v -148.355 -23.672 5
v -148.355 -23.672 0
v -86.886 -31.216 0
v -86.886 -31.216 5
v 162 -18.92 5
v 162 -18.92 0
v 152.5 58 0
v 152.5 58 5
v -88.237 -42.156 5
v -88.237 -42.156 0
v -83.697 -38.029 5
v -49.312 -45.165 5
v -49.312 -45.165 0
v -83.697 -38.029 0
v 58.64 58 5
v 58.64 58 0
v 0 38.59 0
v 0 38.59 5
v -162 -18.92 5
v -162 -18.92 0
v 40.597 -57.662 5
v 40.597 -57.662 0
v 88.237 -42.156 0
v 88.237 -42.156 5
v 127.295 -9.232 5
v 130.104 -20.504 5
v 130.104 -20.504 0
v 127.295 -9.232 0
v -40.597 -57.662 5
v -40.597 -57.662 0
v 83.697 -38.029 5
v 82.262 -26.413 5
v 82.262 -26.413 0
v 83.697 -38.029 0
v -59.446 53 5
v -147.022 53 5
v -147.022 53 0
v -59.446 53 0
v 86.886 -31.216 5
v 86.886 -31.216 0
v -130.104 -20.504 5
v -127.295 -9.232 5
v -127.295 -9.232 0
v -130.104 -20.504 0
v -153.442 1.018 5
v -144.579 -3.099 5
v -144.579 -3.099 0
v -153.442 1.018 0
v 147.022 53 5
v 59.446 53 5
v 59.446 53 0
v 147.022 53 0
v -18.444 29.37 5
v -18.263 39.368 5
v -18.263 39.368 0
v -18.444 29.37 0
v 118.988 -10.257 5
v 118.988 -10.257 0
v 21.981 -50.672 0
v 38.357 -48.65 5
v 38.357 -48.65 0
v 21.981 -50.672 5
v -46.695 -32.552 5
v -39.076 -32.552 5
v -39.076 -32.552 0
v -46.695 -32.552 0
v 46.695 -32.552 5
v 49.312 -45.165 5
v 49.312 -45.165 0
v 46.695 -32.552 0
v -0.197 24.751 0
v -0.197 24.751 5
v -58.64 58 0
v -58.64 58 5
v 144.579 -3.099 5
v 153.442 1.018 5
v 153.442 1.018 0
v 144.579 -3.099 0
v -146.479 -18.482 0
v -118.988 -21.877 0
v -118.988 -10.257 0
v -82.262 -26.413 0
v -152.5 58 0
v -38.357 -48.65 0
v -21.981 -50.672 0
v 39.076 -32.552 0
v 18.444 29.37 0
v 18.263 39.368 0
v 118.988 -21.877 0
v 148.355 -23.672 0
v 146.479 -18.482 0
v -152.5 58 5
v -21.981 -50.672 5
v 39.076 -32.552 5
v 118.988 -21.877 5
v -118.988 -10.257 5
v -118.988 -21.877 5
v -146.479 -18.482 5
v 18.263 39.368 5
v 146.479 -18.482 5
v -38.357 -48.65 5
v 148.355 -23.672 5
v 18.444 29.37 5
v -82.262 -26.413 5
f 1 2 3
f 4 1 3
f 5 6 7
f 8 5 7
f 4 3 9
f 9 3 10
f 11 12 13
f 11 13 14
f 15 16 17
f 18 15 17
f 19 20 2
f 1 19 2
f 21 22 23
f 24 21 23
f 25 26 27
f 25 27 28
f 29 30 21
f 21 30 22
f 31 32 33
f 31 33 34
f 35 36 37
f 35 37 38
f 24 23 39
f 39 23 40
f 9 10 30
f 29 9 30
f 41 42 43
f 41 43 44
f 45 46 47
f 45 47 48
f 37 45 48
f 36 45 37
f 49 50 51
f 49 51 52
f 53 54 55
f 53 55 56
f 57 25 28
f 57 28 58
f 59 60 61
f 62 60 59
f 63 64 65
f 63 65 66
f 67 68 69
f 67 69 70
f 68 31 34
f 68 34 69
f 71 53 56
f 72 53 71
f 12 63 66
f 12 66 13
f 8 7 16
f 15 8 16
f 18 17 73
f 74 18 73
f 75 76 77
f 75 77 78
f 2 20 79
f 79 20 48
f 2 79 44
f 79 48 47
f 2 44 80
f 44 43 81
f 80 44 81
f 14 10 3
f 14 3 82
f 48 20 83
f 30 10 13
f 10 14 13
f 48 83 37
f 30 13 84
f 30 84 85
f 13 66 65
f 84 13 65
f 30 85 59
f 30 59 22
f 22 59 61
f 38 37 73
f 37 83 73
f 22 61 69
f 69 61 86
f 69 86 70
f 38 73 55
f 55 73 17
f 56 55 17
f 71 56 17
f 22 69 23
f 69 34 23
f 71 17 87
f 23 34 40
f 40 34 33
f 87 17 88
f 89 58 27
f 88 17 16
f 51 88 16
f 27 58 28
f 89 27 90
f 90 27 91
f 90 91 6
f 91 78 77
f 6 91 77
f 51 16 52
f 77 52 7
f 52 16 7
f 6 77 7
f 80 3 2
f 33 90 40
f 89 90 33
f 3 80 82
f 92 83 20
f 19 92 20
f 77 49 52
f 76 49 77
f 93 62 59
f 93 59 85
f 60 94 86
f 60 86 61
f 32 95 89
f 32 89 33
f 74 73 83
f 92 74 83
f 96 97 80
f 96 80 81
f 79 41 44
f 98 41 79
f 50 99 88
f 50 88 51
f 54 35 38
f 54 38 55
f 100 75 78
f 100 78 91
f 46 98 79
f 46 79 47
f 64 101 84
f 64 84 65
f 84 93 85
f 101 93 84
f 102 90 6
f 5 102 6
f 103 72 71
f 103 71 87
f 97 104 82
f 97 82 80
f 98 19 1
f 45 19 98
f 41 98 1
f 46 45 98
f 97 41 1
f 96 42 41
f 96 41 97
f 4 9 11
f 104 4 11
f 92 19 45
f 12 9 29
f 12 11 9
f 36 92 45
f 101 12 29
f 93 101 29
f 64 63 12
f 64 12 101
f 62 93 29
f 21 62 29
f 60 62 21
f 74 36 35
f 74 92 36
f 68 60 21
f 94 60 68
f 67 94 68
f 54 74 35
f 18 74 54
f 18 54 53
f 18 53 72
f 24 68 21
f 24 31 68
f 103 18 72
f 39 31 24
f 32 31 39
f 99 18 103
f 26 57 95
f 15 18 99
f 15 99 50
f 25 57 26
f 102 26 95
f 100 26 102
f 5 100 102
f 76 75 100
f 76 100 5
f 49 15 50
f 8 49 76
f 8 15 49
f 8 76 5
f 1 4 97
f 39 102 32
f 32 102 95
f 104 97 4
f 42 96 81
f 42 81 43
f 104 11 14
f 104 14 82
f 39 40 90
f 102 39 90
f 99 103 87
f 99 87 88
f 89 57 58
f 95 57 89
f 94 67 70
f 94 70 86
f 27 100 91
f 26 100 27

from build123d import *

# Parameters (mm, degrees)
EXTRUDE_2_DEPTH     = 5
CUT_EXTRUDE_5_DEPTH = 173.142382928


with BuildPart() as part:
    # Эскиз4 → Бобышка-Вытянуть2 (new body)
    with BuildSketch(Plane.XY):
        Polygon((152.5, 58), (58.64, 58), (0, 38.59), (-58.64, 58), (-152.5, 58), (-162, -18.92), (-148.354716995, -23.671565122), (-86.885994913, -31.21617284), (-88.237138959, -42.15617284), (-40.597138959, -57.662313559), (40.597138959, -57.662313559), (88.237138959, -42.15617284), (86.885994913, -31.21617284), (148.354716995, -23.671565122), (162, -18.92), align=None)
        with BuildLine():
            Line((21.848195141, 15.513282482), (18.617591482, 3.873282482))
            ThreePointArc((18.617591482, 3.873282482), (0, -28.455), (-18.617591482, 3.873282482))
            Line((-18.617591482, 3.873282482), (-21.848195141, 15.513282482))
            Line((-21.848195141, 15.513282482), (-10.908195141, 11.626317085))
            ThreePointArc((-10.908195141, 11.626317085), (0, 14.595), (10.908195141, 11.626317085))
            Line((10.908195141, 11.626317085), (21.848195141, 15.513282482))
        make_face(mode=Mode.SUBTRACT)
    extrude(amount=EXTRUDE_2_DEPTH)

    # Эскиз6 → Вырез-Вытянуть5 (cut, through all)
    with BuildSketch(Plane.XY.offset(5)):
        Polygon((-144.579383614, -3.098859092), (-153.441535305, 1.018454037), (-147.02155758, 53), (-59.446003505, 53), (-18.263209753, 39.3683829), (-18.443630735, 29.370010619), (-0.197288626, 24.750877673), (18.443630735, 29.370010619), (18.263209753, 39.3683829), (59.446003505, 53), (147.02155758, 53), (153.441535305, 1.018454037), (144.579383614, -3.098859092), (146.479275056, -18.481980118), (130.103694609, -20.504445202), (127.29501371, -9.23154094), (118.988149093, -10.257479758), (118.988149093, -21.877269986), (82.262397943, -26.413081686), (83.697009804, -38.028907412), (49.312411241, -45.164872427), (46.694846048, -32.552152466), (39.076267674, -32.552152466), (38.356972556, -48.649893027), (21.981392109, -50.672358111), (-21.981392109, -50.672358111), (-38.356972556, -48.649893027), (-39.076267674, -32.552152466), (-46.694846048, -32.552152466), (-49.312411241, -45.164872427), (-83.697009804, -38.028907412), (-82.262397943, -26.413081686), (-118.988149093, -21.877269986), (-118.988149093, -10.257479758), (-127.29501371, -9.23154094), (-130.103694609, -20.504445202), (-146.479275056, -18.481980118), align=None)
    extrude(amount=-CUT_EXTRUDE_5_DEPTH, mode=Mode.SUBTRACT)


solid = part.part
